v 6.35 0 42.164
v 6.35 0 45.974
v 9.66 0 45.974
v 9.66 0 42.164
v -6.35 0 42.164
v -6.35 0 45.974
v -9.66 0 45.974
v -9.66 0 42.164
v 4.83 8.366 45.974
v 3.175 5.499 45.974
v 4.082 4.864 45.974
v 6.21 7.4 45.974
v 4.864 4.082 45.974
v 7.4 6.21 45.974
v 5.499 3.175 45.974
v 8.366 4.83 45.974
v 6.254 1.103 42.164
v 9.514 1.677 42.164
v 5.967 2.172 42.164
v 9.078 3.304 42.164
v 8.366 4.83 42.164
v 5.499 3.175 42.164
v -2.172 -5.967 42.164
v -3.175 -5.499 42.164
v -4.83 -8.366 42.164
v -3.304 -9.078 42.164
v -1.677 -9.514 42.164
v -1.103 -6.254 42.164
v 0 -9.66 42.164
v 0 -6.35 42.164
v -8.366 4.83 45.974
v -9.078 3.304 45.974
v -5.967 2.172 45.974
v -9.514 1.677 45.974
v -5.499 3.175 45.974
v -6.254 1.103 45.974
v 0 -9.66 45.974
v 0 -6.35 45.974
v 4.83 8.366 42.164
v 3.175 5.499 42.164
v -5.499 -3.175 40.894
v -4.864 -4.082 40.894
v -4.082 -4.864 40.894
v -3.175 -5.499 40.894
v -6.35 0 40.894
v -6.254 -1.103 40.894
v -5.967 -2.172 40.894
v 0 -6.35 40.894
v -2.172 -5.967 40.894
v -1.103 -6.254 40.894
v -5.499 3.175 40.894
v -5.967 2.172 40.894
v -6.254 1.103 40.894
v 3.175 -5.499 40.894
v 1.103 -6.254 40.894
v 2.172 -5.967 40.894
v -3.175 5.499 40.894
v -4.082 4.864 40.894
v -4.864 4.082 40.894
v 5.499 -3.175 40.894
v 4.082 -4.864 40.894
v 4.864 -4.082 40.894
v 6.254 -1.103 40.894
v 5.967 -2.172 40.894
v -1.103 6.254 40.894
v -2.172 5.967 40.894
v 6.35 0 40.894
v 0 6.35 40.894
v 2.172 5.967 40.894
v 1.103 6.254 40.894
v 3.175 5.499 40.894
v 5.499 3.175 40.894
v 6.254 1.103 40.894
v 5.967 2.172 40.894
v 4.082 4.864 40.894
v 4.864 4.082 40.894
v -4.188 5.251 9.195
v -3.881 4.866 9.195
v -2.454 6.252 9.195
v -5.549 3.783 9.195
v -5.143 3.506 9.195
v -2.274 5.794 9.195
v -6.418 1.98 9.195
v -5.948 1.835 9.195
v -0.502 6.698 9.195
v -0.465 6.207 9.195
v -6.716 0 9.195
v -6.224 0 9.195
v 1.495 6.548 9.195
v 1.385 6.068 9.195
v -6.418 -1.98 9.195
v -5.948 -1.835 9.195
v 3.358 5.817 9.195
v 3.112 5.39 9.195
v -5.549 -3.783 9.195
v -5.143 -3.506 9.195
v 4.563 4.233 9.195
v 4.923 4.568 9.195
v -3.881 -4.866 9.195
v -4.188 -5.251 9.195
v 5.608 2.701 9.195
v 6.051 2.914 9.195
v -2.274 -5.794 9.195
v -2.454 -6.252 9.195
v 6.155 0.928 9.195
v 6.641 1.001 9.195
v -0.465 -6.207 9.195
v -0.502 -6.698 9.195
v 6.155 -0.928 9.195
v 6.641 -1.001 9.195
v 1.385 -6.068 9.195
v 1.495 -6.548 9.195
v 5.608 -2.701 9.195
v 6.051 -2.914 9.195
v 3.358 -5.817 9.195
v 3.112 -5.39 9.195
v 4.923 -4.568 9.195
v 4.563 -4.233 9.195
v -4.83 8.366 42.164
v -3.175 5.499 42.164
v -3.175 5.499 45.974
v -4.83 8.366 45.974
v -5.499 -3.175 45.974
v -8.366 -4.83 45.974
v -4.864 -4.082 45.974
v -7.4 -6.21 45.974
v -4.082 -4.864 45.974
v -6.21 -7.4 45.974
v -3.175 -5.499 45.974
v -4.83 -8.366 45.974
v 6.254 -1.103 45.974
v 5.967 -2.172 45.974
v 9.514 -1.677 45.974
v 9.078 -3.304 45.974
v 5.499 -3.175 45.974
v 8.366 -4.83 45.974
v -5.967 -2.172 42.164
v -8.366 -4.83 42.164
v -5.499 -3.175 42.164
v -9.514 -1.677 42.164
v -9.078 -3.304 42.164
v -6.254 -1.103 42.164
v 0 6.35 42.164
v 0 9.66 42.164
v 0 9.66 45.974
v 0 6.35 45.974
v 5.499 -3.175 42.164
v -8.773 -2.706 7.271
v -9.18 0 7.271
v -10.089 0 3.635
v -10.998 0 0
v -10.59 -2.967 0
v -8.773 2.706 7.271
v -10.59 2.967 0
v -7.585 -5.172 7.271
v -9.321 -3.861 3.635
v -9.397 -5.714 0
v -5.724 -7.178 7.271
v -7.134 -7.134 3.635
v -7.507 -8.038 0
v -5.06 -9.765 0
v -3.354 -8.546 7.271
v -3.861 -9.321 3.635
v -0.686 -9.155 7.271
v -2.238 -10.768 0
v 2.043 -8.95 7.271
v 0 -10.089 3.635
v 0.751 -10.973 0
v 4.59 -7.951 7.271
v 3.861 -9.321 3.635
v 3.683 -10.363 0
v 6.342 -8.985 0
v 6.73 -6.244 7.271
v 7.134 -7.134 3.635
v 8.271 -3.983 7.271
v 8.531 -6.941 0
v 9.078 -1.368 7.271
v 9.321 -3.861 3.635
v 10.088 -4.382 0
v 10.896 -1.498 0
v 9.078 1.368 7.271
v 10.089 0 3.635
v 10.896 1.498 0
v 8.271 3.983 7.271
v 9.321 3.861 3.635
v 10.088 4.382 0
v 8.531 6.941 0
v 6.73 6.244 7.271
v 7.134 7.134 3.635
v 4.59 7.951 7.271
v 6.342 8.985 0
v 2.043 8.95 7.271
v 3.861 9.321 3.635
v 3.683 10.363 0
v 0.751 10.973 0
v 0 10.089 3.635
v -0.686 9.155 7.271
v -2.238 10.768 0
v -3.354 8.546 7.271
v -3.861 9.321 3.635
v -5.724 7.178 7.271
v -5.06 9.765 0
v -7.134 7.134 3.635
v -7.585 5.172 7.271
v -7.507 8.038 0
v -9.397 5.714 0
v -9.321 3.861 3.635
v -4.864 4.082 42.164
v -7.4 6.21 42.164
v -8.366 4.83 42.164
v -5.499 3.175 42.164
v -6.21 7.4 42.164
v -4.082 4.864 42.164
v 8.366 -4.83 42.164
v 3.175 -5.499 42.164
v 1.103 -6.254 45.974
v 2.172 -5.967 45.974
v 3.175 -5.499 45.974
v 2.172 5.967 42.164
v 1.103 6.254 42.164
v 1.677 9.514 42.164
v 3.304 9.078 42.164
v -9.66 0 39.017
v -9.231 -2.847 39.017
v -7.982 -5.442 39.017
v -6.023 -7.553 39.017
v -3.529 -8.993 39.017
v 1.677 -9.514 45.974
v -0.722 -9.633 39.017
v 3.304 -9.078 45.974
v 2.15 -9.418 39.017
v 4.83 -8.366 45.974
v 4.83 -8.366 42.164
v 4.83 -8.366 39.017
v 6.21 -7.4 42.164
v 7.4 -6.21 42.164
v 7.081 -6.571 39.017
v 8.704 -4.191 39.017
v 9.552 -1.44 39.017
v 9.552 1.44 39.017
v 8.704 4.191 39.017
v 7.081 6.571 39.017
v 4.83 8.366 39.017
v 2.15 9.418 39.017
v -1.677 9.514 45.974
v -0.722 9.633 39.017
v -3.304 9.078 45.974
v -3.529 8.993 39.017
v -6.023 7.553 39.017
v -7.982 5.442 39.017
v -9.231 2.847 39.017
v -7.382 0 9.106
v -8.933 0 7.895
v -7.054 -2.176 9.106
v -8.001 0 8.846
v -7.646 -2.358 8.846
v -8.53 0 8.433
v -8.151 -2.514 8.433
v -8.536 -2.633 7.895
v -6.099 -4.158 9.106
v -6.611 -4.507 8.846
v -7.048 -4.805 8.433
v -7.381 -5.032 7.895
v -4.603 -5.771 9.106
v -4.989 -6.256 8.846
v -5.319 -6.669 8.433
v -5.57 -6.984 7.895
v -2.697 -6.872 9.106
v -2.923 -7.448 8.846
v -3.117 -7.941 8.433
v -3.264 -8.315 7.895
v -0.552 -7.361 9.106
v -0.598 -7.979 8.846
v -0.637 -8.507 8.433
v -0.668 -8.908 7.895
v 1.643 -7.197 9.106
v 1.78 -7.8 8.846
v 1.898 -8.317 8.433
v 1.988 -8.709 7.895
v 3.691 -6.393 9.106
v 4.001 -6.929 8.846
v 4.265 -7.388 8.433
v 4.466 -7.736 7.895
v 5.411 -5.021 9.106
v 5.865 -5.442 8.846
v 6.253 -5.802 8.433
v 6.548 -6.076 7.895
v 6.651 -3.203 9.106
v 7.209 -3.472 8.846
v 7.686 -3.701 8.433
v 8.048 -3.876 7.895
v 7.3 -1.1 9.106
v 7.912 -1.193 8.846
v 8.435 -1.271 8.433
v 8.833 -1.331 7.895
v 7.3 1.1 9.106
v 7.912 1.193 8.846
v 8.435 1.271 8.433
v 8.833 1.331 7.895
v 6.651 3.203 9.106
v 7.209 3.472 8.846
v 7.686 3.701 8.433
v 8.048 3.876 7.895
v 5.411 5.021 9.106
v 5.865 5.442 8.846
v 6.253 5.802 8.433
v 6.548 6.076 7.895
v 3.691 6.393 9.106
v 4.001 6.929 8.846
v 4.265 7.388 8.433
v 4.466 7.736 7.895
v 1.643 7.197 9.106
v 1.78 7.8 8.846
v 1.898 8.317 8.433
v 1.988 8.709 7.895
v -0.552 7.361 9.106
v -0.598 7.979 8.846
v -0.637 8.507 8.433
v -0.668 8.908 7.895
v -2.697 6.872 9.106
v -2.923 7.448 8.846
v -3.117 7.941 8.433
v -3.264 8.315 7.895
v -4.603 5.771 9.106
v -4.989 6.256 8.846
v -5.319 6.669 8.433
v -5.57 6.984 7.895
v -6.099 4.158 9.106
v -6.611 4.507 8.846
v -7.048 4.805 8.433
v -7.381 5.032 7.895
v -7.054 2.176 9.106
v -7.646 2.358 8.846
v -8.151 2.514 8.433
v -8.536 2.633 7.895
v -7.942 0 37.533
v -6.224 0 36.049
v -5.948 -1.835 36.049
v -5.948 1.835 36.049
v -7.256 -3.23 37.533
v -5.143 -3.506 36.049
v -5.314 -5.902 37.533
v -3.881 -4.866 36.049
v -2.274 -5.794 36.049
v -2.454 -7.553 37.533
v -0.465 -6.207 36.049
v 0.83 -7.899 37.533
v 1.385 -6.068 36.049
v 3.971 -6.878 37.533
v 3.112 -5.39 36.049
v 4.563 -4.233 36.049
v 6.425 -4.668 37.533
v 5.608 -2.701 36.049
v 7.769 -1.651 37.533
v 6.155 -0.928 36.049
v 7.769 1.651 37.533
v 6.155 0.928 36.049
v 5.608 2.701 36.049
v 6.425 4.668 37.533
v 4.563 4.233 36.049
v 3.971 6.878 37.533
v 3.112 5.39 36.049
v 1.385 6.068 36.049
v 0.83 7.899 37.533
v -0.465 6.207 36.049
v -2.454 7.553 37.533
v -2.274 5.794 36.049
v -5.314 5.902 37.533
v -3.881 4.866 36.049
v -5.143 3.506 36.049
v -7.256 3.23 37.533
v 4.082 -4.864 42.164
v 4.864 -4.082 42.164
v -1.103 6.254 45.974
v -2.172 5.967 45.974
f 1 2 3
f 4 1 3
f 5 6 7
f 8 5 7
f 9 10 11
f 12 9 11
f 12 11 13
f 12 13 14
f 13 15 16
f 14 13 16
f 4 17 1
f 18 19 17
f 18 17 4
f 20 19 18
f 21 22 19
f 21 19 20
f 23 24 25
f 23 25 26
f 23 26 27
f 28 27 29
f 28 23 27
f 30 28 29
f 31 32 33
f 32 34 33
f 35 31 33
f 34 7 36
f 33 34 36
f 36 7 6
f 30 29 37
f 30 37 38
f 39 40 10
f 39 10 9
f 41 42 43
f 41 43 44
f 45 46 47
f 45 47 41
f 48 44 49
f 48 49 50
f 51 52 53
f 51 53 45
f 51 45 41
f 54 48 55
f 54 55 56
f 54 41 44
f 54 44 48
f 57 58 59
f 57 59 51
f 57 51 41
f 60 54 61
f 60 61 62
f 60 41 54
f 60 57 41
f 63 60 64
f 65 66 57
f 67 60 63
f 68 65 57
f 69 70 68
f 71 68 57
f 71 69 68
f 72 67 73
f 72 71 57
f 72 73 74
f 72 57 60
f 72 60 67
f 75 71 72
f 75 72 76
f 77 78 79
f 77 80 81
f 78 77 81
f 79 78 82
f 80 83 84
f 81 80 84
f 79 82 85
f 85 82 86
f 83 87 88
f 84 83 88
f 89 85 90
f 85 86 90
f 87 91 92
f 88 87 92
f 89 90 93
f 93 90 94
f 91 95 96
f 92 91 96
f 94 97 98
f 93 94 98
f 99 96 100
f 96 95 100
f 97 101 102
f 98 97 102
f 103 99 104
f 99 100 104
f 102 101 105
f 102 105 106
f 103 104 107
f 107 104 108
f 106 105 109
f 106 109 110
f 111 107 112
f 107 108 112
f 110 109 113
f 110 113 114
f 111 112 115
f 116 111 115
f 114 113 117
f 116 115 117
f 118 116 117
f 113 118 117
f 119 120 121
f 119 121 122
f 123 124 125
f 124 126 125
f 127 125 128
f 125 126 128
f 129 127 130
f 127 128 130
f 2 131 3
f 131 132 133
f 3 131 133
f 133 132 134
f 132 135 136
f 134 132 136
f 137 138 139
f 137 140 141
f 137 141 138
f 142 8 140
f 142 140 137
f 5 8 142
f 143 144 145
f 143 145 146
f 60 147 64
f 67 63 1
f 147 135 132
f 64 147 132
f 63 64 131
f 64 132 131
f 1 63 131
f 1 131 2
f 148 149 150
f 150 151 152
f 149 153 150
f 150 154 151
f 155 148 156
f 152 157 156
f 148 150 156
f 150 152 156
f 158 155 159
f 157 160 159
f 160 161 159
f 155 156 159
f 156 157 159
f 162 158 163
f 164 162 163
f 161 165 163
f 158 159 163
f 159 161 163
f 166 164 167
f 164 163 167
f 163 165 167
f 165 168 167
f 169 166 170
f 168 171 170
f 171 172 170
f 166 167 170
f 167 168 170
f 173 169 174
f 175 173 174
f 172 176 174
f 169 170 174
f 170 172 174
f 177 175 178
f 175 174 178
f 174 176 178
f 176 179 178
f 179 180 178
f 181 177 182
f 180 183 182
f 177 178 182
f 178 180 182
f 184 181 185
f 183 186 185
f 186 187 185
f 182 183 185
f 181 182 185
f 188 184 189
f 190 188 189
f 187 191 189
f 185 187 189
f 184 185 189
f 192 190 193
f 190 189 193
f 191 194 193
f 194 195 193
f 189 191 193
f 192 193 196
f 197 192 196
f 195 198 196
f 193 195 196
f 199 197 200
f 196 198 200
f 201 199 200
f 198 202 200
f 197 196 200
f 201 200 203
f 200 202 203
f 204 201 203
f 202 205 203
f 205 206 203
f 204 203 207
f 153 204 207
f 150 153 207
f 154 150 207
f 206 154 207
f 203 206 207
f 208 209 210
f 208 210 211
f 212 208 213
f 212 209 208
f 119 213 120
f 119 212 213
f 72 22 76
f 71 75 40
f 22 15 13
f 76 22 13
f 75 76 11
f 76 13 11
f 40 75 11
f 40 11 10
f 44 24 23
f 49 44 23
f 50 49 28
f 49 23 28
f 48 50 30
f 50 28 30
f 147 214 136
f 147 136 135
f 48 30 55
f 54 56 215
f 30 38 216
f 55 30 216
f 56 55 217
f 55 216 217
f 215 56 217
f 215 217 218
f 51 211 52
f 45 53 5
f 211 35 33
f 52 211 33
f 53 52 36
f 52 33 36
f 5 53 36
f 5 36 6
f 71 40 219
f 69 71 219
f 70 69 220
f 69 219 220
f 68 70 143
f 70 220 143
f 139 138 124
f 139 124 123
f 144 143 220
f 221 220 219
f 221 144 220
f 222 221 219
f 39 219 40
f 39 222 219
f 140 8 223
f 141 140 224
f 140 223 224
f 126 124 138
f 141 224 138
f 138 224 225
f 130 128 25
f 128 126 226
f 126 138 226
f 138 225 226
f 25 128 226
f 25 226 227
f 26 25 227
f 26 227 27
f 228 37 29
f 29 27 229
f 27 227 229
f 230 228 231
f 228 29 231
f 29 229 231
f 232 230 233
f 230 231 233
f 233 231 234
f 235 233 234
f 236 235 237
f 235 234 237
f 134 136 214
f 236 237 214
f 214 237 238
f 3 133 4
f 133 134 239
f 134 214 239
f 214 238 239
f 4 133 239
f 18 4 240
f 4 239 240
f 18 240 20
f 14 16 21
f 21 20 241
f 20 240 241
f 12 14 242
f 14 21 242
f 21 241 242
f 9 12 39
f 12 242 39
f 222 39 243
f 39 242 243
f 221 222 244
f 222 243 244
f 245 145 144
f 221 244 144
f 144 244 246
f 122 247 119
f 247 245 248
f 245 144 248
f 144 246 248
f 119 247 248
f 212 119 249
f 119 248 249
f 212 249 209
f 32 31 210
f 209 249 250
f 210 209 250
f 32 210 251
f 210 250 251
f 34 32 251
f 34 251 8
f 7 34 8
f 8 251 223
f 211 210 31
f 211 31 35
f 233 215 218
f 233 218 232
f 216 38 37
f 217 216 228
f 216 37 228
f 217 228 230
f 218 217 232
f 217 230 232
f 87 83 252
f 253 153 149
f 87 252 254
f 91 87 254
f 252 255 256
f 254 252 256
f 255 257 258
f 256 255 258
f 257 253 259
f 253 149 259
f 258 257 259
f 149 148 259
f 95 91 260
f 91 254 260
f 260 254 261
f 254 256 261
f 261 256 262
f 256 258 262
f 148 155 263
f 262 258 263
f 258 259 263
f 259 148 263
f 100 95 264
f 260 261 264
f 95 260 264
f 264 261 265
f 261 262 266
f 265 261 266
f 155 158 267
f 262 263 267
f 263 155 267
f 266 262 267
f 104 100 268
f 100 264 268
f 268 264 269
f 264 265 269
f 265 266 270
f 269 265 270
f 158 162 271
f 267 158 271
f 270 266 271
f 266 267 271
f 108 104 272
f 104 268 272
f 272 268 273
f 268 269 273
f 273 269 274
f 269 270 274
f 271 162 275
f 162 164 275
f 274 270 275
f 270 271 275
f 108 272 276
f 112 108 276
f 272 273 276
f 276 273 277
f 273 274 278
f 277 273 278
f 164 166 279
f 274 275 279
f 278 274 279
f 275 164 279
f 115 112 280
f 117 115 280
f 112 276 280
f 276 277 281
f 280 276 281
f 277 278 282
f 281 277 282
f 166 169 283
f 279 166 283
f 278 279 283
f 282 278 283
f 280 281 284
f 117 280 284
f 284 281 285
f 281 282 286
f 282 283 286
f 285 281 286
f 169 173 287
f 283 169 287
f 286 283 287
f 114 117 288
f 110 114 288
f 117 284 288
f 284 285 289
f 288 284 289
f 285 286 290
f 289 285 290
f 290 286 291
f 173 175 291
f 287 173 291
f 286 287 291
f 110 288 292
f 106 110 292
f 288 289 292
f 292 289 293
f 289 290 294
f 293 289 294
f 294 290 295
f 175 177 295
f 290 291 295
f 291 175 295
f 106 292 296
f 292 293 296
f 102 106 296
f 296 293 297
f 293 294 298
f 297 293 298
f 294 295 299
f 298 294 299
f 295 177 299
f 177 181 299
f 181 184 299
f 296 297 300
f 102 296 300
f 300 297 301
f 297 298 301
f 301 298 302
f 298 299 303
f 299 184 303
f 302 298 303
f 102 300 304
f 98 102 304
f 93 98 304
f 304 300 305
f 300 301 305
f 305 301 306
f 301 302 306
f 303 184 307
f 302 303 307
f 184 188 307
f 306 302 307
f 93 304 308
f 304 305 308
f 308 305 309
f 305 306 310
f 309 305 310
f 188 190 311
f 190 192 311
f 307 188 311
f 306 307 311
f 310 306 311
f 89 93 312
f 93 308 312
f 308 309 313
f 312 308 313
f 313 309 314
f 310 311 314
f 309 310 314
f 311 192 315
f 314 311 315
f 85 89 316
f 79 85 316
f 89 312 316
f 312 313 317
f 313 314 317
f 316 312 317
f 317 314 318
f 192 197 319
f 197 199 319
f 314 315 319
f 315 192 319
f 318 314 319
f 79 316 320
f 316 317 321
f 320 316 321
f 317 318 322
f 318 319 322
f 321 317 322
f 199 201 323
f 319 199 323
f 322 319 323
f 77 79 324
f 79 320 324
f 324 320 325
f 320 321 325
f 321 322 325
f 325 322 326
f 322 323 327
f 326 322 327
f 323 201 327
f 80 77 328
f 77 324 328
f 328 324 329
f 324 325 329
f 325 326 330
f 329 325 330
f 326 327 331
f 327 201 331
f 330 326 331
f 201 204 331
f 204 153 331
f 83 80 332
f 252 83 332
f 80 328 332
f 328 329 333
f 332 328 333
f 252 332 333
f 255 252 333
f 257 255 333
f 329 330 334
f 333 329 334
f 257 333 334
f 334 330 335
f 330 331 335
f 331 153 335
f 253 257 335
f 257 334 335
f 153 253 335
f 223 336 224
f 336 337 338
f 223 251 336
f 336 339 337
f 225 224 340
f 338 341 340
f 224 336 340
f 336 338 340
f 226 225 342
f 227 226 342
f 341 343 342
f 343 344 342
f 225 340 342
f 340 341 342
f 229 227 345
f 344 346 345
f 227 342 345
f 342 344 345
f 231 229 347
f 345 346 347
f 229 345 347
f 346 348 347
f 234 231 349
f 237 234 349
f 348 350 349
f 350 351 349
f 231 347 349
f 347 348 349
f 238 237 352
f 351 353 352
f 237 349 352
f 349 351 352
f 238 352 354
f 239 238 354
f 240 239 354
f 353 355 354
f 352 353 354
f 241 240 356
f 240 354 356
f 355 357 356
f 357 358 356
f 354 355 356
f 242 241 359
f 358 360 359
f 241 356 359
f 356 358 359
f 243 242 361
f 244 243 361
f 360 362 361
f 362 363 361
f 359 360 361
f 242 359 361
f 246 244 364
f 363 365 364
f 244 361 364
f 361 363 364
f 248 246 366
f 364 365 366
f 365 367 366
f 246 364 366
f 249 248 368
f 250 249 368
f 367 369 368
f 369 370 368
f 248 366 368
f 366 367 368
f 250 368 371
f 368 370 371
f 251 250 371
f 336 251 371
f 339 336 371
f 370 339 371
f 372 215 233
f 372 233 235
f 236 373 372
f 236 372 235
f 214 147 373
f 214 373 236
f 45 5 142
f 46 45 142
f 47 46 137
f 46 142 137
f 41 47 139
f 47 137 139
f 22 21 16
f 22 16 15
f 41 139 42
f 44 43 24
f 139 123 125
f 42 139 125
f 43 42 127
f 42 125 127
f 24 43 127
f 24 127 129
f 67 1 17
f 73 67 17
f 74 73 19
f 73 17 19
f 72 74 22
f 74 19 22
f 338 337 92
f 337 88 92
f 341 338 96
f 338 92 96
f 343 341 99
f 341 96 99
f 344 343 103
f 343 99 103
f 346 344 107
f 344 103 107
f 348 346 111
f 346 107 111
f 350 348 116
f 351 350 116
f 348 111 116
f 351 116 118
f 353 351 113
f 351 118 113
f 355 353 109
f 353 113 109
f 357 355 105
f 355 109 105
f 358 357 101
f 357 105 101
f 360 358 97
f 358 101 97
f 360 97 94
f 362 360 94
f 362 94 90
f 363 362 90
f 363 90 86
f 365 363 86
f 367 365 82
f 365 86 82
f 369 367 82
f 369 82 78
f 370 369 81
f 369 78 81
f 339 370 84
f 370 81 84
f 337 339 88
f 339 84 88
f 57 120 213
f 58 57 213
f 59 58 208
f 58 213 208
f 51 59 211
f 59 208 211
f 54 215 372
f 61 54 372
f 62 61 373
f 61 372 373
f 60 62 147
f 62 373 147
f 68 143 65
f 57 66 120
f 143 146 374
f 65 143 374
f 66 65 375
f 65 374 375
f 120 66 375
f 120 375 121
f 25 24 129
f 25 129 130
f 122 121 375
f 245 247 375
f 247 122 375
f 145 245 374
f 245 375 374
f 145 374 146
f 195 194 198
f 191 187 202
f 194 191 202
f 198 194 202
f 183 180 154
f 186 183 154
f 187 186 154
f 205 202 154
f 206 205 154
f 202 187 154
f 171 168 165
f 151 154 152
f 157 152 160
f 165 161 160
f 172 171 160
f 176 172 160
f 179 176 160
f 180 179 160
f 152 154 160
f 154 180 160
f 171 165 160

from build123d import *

# Parameters (mm, degrees)
F2_R     = 2.54
F4_DEPTH = 3.81
F5_DEPTH = 5.08


with BuildPart() as f1:
    # F0 (on Front) → F1 (revolve)
    with BuildSketch(Plane.XZ):
        Polygon((0, 0), (0, 45.974), (-9.660285, 45.974), (-9.660285, 39.017074), (-6.224093, 36.049455), (-6.224093, 9.1948), (-8.699501, 9.1948), (-10.9982, 0), align=None)
    revolve(axis=Axis((0, 0, 22.987), (0, 0, 1)))

    # F2
    f2_edges = [f1.edges().sort_by_distance(p)[0] for p in [
        (8.699501, 0, 9.1948),
    ]]
    fillet(f2_edges, radius=F2_R)

    # F3 (on face) → F4 (cut)
    with BuildSketch(Plane.XY.offset(45.974)):
        with BuildLine():
            ThreePointArc((-5.499261, 3.175), (-4.490128, 4.490128), (-3.175, 5.499261))
            Line((-3.175, 5.499261), (-4.830143, 8.366052))
            ThreePointArc((-4.830143, 8.366052), (-6.830853, 6.830853), (-8.366052, 4.830143))
            Line((-8.366052, 4.830143), (-5.499261, 3.175))
        make_face()
        with BuildLine():
            ThreePointArc((0, 6.35), (1.643501, 6.133629), (3.175, 5.499261))
            Line((3.175, 5.499261), (4.830143, 8.366052))
            ThreePointArc((4.830143, 8.366052), (2.500266, 9.331119), (0, 9.660285))
            Line((0, 9.660285), (0, 6.35))
        make_face()
        with BuildLine():
            ThreePointArc((5.499261, 3.175), (6.133629, 1.643501), (6.35, 0))
            Line((6.35, 0), (9.660285, 0))
            ThreePointArc((9.660285, 0), (9.331119, 2.500266), (8.366052, 4.830143))
            Line((8.366052, 4.830143), (5.499261, 3.175))
        make_face()
        with BuildLine():
            Line((8.366052, -4.830143), (5.499261, -3.175))
            ThreePointArc((5.499261, -3.175), (4.490128, -4.490128), (3.175, -5.499261))
            Line((3.175, -5.499261), (4.830143, -8.366052))
            ThreePointArc((4.830143, -8.366052), (6.830853, -6.830853), (8.366052, -4.830143))
        make_face()
        with BuildLine():
            Line((0, -9.660285), (0, -6.35))
            ThreePointArc((0, -6.35), (-1.643501, -6.133629), (-3.175, -5.499261))
            Line((-3.175, -5.499261), (-4.830143, -8.366052))
            ThreePointArc((-4.830143, -8.366052), (-2.500266, -9.331119), (0, -9.660285))
        make_face()
        with BuildLine():
            Line((-8.366052, -4.830143), (-5.499261, -3.175))
            ThreePointArc((-5.499261, -3.175), (-6.133629, -1.643501), (-6.35, 0))
            Line((-6.35, 0), (-9.660285, 0))
            ThreePointArc((-9.660285, 0), (-9.331119, -2.500266), (-8.366052, -4.830143))
        make_face()
    extrude(amount=-F4_DEPTH, mode=Mode.SUBTRACT)

    # F3 (on face) → F5 (cut)
    with BuildSketch(Plane.XY.offset(45.974)):
        with BuildLine():
            ThreePointArc((5.499261, -3.175), (6.133629, -1.643501), (6.35, 0))
            ThreePointArc((6.35, 0), (6.133629, 1.643501), (5.499261, 3.175))
            ThreePointArc((5.499261, 3.175), (4.490128, 4.490128), (3.175, 5.499261))
            ThreePointArc((3.175, 5.499261), (1.643501, 6.133629), (0, 6.35))
            ThreePointArc((0, 6.35), (-1.643501, 6.133629), (-3.175, 5.499261))
            ThreePointArc((-3.175, 5.499261), (-4.490128, 4.490128), (-5.499261, 3.175))
            ThreePointArc((-5.499261, 3.175), (-6.133629, 1.643501), (-6.35, 0))
            ThreePointArc((-6.35, 0), (-6.133629, -1.643501), (-5.499261, -3.175))
            ThreePointArc((-5.499261, -3.175), (-4.490128, -4.490128), (-3.175, -5.499261))
            ThreePointArc((-3.175, -5.499261), (-1.643501, -6.133629), (0, -6.35))
            ThreePointArc((0, -6.35), (1.643501, -6.133629), (3.175, -5.499261))
            ThreePointArc((3.175, -5.499261), (4.490128, -4.490128), (5.499261, -3.175))
        make_face()
    extrude(amount=-F5_DEPTH, mode=Mode.SUBTRACT)


solid = f1.part
